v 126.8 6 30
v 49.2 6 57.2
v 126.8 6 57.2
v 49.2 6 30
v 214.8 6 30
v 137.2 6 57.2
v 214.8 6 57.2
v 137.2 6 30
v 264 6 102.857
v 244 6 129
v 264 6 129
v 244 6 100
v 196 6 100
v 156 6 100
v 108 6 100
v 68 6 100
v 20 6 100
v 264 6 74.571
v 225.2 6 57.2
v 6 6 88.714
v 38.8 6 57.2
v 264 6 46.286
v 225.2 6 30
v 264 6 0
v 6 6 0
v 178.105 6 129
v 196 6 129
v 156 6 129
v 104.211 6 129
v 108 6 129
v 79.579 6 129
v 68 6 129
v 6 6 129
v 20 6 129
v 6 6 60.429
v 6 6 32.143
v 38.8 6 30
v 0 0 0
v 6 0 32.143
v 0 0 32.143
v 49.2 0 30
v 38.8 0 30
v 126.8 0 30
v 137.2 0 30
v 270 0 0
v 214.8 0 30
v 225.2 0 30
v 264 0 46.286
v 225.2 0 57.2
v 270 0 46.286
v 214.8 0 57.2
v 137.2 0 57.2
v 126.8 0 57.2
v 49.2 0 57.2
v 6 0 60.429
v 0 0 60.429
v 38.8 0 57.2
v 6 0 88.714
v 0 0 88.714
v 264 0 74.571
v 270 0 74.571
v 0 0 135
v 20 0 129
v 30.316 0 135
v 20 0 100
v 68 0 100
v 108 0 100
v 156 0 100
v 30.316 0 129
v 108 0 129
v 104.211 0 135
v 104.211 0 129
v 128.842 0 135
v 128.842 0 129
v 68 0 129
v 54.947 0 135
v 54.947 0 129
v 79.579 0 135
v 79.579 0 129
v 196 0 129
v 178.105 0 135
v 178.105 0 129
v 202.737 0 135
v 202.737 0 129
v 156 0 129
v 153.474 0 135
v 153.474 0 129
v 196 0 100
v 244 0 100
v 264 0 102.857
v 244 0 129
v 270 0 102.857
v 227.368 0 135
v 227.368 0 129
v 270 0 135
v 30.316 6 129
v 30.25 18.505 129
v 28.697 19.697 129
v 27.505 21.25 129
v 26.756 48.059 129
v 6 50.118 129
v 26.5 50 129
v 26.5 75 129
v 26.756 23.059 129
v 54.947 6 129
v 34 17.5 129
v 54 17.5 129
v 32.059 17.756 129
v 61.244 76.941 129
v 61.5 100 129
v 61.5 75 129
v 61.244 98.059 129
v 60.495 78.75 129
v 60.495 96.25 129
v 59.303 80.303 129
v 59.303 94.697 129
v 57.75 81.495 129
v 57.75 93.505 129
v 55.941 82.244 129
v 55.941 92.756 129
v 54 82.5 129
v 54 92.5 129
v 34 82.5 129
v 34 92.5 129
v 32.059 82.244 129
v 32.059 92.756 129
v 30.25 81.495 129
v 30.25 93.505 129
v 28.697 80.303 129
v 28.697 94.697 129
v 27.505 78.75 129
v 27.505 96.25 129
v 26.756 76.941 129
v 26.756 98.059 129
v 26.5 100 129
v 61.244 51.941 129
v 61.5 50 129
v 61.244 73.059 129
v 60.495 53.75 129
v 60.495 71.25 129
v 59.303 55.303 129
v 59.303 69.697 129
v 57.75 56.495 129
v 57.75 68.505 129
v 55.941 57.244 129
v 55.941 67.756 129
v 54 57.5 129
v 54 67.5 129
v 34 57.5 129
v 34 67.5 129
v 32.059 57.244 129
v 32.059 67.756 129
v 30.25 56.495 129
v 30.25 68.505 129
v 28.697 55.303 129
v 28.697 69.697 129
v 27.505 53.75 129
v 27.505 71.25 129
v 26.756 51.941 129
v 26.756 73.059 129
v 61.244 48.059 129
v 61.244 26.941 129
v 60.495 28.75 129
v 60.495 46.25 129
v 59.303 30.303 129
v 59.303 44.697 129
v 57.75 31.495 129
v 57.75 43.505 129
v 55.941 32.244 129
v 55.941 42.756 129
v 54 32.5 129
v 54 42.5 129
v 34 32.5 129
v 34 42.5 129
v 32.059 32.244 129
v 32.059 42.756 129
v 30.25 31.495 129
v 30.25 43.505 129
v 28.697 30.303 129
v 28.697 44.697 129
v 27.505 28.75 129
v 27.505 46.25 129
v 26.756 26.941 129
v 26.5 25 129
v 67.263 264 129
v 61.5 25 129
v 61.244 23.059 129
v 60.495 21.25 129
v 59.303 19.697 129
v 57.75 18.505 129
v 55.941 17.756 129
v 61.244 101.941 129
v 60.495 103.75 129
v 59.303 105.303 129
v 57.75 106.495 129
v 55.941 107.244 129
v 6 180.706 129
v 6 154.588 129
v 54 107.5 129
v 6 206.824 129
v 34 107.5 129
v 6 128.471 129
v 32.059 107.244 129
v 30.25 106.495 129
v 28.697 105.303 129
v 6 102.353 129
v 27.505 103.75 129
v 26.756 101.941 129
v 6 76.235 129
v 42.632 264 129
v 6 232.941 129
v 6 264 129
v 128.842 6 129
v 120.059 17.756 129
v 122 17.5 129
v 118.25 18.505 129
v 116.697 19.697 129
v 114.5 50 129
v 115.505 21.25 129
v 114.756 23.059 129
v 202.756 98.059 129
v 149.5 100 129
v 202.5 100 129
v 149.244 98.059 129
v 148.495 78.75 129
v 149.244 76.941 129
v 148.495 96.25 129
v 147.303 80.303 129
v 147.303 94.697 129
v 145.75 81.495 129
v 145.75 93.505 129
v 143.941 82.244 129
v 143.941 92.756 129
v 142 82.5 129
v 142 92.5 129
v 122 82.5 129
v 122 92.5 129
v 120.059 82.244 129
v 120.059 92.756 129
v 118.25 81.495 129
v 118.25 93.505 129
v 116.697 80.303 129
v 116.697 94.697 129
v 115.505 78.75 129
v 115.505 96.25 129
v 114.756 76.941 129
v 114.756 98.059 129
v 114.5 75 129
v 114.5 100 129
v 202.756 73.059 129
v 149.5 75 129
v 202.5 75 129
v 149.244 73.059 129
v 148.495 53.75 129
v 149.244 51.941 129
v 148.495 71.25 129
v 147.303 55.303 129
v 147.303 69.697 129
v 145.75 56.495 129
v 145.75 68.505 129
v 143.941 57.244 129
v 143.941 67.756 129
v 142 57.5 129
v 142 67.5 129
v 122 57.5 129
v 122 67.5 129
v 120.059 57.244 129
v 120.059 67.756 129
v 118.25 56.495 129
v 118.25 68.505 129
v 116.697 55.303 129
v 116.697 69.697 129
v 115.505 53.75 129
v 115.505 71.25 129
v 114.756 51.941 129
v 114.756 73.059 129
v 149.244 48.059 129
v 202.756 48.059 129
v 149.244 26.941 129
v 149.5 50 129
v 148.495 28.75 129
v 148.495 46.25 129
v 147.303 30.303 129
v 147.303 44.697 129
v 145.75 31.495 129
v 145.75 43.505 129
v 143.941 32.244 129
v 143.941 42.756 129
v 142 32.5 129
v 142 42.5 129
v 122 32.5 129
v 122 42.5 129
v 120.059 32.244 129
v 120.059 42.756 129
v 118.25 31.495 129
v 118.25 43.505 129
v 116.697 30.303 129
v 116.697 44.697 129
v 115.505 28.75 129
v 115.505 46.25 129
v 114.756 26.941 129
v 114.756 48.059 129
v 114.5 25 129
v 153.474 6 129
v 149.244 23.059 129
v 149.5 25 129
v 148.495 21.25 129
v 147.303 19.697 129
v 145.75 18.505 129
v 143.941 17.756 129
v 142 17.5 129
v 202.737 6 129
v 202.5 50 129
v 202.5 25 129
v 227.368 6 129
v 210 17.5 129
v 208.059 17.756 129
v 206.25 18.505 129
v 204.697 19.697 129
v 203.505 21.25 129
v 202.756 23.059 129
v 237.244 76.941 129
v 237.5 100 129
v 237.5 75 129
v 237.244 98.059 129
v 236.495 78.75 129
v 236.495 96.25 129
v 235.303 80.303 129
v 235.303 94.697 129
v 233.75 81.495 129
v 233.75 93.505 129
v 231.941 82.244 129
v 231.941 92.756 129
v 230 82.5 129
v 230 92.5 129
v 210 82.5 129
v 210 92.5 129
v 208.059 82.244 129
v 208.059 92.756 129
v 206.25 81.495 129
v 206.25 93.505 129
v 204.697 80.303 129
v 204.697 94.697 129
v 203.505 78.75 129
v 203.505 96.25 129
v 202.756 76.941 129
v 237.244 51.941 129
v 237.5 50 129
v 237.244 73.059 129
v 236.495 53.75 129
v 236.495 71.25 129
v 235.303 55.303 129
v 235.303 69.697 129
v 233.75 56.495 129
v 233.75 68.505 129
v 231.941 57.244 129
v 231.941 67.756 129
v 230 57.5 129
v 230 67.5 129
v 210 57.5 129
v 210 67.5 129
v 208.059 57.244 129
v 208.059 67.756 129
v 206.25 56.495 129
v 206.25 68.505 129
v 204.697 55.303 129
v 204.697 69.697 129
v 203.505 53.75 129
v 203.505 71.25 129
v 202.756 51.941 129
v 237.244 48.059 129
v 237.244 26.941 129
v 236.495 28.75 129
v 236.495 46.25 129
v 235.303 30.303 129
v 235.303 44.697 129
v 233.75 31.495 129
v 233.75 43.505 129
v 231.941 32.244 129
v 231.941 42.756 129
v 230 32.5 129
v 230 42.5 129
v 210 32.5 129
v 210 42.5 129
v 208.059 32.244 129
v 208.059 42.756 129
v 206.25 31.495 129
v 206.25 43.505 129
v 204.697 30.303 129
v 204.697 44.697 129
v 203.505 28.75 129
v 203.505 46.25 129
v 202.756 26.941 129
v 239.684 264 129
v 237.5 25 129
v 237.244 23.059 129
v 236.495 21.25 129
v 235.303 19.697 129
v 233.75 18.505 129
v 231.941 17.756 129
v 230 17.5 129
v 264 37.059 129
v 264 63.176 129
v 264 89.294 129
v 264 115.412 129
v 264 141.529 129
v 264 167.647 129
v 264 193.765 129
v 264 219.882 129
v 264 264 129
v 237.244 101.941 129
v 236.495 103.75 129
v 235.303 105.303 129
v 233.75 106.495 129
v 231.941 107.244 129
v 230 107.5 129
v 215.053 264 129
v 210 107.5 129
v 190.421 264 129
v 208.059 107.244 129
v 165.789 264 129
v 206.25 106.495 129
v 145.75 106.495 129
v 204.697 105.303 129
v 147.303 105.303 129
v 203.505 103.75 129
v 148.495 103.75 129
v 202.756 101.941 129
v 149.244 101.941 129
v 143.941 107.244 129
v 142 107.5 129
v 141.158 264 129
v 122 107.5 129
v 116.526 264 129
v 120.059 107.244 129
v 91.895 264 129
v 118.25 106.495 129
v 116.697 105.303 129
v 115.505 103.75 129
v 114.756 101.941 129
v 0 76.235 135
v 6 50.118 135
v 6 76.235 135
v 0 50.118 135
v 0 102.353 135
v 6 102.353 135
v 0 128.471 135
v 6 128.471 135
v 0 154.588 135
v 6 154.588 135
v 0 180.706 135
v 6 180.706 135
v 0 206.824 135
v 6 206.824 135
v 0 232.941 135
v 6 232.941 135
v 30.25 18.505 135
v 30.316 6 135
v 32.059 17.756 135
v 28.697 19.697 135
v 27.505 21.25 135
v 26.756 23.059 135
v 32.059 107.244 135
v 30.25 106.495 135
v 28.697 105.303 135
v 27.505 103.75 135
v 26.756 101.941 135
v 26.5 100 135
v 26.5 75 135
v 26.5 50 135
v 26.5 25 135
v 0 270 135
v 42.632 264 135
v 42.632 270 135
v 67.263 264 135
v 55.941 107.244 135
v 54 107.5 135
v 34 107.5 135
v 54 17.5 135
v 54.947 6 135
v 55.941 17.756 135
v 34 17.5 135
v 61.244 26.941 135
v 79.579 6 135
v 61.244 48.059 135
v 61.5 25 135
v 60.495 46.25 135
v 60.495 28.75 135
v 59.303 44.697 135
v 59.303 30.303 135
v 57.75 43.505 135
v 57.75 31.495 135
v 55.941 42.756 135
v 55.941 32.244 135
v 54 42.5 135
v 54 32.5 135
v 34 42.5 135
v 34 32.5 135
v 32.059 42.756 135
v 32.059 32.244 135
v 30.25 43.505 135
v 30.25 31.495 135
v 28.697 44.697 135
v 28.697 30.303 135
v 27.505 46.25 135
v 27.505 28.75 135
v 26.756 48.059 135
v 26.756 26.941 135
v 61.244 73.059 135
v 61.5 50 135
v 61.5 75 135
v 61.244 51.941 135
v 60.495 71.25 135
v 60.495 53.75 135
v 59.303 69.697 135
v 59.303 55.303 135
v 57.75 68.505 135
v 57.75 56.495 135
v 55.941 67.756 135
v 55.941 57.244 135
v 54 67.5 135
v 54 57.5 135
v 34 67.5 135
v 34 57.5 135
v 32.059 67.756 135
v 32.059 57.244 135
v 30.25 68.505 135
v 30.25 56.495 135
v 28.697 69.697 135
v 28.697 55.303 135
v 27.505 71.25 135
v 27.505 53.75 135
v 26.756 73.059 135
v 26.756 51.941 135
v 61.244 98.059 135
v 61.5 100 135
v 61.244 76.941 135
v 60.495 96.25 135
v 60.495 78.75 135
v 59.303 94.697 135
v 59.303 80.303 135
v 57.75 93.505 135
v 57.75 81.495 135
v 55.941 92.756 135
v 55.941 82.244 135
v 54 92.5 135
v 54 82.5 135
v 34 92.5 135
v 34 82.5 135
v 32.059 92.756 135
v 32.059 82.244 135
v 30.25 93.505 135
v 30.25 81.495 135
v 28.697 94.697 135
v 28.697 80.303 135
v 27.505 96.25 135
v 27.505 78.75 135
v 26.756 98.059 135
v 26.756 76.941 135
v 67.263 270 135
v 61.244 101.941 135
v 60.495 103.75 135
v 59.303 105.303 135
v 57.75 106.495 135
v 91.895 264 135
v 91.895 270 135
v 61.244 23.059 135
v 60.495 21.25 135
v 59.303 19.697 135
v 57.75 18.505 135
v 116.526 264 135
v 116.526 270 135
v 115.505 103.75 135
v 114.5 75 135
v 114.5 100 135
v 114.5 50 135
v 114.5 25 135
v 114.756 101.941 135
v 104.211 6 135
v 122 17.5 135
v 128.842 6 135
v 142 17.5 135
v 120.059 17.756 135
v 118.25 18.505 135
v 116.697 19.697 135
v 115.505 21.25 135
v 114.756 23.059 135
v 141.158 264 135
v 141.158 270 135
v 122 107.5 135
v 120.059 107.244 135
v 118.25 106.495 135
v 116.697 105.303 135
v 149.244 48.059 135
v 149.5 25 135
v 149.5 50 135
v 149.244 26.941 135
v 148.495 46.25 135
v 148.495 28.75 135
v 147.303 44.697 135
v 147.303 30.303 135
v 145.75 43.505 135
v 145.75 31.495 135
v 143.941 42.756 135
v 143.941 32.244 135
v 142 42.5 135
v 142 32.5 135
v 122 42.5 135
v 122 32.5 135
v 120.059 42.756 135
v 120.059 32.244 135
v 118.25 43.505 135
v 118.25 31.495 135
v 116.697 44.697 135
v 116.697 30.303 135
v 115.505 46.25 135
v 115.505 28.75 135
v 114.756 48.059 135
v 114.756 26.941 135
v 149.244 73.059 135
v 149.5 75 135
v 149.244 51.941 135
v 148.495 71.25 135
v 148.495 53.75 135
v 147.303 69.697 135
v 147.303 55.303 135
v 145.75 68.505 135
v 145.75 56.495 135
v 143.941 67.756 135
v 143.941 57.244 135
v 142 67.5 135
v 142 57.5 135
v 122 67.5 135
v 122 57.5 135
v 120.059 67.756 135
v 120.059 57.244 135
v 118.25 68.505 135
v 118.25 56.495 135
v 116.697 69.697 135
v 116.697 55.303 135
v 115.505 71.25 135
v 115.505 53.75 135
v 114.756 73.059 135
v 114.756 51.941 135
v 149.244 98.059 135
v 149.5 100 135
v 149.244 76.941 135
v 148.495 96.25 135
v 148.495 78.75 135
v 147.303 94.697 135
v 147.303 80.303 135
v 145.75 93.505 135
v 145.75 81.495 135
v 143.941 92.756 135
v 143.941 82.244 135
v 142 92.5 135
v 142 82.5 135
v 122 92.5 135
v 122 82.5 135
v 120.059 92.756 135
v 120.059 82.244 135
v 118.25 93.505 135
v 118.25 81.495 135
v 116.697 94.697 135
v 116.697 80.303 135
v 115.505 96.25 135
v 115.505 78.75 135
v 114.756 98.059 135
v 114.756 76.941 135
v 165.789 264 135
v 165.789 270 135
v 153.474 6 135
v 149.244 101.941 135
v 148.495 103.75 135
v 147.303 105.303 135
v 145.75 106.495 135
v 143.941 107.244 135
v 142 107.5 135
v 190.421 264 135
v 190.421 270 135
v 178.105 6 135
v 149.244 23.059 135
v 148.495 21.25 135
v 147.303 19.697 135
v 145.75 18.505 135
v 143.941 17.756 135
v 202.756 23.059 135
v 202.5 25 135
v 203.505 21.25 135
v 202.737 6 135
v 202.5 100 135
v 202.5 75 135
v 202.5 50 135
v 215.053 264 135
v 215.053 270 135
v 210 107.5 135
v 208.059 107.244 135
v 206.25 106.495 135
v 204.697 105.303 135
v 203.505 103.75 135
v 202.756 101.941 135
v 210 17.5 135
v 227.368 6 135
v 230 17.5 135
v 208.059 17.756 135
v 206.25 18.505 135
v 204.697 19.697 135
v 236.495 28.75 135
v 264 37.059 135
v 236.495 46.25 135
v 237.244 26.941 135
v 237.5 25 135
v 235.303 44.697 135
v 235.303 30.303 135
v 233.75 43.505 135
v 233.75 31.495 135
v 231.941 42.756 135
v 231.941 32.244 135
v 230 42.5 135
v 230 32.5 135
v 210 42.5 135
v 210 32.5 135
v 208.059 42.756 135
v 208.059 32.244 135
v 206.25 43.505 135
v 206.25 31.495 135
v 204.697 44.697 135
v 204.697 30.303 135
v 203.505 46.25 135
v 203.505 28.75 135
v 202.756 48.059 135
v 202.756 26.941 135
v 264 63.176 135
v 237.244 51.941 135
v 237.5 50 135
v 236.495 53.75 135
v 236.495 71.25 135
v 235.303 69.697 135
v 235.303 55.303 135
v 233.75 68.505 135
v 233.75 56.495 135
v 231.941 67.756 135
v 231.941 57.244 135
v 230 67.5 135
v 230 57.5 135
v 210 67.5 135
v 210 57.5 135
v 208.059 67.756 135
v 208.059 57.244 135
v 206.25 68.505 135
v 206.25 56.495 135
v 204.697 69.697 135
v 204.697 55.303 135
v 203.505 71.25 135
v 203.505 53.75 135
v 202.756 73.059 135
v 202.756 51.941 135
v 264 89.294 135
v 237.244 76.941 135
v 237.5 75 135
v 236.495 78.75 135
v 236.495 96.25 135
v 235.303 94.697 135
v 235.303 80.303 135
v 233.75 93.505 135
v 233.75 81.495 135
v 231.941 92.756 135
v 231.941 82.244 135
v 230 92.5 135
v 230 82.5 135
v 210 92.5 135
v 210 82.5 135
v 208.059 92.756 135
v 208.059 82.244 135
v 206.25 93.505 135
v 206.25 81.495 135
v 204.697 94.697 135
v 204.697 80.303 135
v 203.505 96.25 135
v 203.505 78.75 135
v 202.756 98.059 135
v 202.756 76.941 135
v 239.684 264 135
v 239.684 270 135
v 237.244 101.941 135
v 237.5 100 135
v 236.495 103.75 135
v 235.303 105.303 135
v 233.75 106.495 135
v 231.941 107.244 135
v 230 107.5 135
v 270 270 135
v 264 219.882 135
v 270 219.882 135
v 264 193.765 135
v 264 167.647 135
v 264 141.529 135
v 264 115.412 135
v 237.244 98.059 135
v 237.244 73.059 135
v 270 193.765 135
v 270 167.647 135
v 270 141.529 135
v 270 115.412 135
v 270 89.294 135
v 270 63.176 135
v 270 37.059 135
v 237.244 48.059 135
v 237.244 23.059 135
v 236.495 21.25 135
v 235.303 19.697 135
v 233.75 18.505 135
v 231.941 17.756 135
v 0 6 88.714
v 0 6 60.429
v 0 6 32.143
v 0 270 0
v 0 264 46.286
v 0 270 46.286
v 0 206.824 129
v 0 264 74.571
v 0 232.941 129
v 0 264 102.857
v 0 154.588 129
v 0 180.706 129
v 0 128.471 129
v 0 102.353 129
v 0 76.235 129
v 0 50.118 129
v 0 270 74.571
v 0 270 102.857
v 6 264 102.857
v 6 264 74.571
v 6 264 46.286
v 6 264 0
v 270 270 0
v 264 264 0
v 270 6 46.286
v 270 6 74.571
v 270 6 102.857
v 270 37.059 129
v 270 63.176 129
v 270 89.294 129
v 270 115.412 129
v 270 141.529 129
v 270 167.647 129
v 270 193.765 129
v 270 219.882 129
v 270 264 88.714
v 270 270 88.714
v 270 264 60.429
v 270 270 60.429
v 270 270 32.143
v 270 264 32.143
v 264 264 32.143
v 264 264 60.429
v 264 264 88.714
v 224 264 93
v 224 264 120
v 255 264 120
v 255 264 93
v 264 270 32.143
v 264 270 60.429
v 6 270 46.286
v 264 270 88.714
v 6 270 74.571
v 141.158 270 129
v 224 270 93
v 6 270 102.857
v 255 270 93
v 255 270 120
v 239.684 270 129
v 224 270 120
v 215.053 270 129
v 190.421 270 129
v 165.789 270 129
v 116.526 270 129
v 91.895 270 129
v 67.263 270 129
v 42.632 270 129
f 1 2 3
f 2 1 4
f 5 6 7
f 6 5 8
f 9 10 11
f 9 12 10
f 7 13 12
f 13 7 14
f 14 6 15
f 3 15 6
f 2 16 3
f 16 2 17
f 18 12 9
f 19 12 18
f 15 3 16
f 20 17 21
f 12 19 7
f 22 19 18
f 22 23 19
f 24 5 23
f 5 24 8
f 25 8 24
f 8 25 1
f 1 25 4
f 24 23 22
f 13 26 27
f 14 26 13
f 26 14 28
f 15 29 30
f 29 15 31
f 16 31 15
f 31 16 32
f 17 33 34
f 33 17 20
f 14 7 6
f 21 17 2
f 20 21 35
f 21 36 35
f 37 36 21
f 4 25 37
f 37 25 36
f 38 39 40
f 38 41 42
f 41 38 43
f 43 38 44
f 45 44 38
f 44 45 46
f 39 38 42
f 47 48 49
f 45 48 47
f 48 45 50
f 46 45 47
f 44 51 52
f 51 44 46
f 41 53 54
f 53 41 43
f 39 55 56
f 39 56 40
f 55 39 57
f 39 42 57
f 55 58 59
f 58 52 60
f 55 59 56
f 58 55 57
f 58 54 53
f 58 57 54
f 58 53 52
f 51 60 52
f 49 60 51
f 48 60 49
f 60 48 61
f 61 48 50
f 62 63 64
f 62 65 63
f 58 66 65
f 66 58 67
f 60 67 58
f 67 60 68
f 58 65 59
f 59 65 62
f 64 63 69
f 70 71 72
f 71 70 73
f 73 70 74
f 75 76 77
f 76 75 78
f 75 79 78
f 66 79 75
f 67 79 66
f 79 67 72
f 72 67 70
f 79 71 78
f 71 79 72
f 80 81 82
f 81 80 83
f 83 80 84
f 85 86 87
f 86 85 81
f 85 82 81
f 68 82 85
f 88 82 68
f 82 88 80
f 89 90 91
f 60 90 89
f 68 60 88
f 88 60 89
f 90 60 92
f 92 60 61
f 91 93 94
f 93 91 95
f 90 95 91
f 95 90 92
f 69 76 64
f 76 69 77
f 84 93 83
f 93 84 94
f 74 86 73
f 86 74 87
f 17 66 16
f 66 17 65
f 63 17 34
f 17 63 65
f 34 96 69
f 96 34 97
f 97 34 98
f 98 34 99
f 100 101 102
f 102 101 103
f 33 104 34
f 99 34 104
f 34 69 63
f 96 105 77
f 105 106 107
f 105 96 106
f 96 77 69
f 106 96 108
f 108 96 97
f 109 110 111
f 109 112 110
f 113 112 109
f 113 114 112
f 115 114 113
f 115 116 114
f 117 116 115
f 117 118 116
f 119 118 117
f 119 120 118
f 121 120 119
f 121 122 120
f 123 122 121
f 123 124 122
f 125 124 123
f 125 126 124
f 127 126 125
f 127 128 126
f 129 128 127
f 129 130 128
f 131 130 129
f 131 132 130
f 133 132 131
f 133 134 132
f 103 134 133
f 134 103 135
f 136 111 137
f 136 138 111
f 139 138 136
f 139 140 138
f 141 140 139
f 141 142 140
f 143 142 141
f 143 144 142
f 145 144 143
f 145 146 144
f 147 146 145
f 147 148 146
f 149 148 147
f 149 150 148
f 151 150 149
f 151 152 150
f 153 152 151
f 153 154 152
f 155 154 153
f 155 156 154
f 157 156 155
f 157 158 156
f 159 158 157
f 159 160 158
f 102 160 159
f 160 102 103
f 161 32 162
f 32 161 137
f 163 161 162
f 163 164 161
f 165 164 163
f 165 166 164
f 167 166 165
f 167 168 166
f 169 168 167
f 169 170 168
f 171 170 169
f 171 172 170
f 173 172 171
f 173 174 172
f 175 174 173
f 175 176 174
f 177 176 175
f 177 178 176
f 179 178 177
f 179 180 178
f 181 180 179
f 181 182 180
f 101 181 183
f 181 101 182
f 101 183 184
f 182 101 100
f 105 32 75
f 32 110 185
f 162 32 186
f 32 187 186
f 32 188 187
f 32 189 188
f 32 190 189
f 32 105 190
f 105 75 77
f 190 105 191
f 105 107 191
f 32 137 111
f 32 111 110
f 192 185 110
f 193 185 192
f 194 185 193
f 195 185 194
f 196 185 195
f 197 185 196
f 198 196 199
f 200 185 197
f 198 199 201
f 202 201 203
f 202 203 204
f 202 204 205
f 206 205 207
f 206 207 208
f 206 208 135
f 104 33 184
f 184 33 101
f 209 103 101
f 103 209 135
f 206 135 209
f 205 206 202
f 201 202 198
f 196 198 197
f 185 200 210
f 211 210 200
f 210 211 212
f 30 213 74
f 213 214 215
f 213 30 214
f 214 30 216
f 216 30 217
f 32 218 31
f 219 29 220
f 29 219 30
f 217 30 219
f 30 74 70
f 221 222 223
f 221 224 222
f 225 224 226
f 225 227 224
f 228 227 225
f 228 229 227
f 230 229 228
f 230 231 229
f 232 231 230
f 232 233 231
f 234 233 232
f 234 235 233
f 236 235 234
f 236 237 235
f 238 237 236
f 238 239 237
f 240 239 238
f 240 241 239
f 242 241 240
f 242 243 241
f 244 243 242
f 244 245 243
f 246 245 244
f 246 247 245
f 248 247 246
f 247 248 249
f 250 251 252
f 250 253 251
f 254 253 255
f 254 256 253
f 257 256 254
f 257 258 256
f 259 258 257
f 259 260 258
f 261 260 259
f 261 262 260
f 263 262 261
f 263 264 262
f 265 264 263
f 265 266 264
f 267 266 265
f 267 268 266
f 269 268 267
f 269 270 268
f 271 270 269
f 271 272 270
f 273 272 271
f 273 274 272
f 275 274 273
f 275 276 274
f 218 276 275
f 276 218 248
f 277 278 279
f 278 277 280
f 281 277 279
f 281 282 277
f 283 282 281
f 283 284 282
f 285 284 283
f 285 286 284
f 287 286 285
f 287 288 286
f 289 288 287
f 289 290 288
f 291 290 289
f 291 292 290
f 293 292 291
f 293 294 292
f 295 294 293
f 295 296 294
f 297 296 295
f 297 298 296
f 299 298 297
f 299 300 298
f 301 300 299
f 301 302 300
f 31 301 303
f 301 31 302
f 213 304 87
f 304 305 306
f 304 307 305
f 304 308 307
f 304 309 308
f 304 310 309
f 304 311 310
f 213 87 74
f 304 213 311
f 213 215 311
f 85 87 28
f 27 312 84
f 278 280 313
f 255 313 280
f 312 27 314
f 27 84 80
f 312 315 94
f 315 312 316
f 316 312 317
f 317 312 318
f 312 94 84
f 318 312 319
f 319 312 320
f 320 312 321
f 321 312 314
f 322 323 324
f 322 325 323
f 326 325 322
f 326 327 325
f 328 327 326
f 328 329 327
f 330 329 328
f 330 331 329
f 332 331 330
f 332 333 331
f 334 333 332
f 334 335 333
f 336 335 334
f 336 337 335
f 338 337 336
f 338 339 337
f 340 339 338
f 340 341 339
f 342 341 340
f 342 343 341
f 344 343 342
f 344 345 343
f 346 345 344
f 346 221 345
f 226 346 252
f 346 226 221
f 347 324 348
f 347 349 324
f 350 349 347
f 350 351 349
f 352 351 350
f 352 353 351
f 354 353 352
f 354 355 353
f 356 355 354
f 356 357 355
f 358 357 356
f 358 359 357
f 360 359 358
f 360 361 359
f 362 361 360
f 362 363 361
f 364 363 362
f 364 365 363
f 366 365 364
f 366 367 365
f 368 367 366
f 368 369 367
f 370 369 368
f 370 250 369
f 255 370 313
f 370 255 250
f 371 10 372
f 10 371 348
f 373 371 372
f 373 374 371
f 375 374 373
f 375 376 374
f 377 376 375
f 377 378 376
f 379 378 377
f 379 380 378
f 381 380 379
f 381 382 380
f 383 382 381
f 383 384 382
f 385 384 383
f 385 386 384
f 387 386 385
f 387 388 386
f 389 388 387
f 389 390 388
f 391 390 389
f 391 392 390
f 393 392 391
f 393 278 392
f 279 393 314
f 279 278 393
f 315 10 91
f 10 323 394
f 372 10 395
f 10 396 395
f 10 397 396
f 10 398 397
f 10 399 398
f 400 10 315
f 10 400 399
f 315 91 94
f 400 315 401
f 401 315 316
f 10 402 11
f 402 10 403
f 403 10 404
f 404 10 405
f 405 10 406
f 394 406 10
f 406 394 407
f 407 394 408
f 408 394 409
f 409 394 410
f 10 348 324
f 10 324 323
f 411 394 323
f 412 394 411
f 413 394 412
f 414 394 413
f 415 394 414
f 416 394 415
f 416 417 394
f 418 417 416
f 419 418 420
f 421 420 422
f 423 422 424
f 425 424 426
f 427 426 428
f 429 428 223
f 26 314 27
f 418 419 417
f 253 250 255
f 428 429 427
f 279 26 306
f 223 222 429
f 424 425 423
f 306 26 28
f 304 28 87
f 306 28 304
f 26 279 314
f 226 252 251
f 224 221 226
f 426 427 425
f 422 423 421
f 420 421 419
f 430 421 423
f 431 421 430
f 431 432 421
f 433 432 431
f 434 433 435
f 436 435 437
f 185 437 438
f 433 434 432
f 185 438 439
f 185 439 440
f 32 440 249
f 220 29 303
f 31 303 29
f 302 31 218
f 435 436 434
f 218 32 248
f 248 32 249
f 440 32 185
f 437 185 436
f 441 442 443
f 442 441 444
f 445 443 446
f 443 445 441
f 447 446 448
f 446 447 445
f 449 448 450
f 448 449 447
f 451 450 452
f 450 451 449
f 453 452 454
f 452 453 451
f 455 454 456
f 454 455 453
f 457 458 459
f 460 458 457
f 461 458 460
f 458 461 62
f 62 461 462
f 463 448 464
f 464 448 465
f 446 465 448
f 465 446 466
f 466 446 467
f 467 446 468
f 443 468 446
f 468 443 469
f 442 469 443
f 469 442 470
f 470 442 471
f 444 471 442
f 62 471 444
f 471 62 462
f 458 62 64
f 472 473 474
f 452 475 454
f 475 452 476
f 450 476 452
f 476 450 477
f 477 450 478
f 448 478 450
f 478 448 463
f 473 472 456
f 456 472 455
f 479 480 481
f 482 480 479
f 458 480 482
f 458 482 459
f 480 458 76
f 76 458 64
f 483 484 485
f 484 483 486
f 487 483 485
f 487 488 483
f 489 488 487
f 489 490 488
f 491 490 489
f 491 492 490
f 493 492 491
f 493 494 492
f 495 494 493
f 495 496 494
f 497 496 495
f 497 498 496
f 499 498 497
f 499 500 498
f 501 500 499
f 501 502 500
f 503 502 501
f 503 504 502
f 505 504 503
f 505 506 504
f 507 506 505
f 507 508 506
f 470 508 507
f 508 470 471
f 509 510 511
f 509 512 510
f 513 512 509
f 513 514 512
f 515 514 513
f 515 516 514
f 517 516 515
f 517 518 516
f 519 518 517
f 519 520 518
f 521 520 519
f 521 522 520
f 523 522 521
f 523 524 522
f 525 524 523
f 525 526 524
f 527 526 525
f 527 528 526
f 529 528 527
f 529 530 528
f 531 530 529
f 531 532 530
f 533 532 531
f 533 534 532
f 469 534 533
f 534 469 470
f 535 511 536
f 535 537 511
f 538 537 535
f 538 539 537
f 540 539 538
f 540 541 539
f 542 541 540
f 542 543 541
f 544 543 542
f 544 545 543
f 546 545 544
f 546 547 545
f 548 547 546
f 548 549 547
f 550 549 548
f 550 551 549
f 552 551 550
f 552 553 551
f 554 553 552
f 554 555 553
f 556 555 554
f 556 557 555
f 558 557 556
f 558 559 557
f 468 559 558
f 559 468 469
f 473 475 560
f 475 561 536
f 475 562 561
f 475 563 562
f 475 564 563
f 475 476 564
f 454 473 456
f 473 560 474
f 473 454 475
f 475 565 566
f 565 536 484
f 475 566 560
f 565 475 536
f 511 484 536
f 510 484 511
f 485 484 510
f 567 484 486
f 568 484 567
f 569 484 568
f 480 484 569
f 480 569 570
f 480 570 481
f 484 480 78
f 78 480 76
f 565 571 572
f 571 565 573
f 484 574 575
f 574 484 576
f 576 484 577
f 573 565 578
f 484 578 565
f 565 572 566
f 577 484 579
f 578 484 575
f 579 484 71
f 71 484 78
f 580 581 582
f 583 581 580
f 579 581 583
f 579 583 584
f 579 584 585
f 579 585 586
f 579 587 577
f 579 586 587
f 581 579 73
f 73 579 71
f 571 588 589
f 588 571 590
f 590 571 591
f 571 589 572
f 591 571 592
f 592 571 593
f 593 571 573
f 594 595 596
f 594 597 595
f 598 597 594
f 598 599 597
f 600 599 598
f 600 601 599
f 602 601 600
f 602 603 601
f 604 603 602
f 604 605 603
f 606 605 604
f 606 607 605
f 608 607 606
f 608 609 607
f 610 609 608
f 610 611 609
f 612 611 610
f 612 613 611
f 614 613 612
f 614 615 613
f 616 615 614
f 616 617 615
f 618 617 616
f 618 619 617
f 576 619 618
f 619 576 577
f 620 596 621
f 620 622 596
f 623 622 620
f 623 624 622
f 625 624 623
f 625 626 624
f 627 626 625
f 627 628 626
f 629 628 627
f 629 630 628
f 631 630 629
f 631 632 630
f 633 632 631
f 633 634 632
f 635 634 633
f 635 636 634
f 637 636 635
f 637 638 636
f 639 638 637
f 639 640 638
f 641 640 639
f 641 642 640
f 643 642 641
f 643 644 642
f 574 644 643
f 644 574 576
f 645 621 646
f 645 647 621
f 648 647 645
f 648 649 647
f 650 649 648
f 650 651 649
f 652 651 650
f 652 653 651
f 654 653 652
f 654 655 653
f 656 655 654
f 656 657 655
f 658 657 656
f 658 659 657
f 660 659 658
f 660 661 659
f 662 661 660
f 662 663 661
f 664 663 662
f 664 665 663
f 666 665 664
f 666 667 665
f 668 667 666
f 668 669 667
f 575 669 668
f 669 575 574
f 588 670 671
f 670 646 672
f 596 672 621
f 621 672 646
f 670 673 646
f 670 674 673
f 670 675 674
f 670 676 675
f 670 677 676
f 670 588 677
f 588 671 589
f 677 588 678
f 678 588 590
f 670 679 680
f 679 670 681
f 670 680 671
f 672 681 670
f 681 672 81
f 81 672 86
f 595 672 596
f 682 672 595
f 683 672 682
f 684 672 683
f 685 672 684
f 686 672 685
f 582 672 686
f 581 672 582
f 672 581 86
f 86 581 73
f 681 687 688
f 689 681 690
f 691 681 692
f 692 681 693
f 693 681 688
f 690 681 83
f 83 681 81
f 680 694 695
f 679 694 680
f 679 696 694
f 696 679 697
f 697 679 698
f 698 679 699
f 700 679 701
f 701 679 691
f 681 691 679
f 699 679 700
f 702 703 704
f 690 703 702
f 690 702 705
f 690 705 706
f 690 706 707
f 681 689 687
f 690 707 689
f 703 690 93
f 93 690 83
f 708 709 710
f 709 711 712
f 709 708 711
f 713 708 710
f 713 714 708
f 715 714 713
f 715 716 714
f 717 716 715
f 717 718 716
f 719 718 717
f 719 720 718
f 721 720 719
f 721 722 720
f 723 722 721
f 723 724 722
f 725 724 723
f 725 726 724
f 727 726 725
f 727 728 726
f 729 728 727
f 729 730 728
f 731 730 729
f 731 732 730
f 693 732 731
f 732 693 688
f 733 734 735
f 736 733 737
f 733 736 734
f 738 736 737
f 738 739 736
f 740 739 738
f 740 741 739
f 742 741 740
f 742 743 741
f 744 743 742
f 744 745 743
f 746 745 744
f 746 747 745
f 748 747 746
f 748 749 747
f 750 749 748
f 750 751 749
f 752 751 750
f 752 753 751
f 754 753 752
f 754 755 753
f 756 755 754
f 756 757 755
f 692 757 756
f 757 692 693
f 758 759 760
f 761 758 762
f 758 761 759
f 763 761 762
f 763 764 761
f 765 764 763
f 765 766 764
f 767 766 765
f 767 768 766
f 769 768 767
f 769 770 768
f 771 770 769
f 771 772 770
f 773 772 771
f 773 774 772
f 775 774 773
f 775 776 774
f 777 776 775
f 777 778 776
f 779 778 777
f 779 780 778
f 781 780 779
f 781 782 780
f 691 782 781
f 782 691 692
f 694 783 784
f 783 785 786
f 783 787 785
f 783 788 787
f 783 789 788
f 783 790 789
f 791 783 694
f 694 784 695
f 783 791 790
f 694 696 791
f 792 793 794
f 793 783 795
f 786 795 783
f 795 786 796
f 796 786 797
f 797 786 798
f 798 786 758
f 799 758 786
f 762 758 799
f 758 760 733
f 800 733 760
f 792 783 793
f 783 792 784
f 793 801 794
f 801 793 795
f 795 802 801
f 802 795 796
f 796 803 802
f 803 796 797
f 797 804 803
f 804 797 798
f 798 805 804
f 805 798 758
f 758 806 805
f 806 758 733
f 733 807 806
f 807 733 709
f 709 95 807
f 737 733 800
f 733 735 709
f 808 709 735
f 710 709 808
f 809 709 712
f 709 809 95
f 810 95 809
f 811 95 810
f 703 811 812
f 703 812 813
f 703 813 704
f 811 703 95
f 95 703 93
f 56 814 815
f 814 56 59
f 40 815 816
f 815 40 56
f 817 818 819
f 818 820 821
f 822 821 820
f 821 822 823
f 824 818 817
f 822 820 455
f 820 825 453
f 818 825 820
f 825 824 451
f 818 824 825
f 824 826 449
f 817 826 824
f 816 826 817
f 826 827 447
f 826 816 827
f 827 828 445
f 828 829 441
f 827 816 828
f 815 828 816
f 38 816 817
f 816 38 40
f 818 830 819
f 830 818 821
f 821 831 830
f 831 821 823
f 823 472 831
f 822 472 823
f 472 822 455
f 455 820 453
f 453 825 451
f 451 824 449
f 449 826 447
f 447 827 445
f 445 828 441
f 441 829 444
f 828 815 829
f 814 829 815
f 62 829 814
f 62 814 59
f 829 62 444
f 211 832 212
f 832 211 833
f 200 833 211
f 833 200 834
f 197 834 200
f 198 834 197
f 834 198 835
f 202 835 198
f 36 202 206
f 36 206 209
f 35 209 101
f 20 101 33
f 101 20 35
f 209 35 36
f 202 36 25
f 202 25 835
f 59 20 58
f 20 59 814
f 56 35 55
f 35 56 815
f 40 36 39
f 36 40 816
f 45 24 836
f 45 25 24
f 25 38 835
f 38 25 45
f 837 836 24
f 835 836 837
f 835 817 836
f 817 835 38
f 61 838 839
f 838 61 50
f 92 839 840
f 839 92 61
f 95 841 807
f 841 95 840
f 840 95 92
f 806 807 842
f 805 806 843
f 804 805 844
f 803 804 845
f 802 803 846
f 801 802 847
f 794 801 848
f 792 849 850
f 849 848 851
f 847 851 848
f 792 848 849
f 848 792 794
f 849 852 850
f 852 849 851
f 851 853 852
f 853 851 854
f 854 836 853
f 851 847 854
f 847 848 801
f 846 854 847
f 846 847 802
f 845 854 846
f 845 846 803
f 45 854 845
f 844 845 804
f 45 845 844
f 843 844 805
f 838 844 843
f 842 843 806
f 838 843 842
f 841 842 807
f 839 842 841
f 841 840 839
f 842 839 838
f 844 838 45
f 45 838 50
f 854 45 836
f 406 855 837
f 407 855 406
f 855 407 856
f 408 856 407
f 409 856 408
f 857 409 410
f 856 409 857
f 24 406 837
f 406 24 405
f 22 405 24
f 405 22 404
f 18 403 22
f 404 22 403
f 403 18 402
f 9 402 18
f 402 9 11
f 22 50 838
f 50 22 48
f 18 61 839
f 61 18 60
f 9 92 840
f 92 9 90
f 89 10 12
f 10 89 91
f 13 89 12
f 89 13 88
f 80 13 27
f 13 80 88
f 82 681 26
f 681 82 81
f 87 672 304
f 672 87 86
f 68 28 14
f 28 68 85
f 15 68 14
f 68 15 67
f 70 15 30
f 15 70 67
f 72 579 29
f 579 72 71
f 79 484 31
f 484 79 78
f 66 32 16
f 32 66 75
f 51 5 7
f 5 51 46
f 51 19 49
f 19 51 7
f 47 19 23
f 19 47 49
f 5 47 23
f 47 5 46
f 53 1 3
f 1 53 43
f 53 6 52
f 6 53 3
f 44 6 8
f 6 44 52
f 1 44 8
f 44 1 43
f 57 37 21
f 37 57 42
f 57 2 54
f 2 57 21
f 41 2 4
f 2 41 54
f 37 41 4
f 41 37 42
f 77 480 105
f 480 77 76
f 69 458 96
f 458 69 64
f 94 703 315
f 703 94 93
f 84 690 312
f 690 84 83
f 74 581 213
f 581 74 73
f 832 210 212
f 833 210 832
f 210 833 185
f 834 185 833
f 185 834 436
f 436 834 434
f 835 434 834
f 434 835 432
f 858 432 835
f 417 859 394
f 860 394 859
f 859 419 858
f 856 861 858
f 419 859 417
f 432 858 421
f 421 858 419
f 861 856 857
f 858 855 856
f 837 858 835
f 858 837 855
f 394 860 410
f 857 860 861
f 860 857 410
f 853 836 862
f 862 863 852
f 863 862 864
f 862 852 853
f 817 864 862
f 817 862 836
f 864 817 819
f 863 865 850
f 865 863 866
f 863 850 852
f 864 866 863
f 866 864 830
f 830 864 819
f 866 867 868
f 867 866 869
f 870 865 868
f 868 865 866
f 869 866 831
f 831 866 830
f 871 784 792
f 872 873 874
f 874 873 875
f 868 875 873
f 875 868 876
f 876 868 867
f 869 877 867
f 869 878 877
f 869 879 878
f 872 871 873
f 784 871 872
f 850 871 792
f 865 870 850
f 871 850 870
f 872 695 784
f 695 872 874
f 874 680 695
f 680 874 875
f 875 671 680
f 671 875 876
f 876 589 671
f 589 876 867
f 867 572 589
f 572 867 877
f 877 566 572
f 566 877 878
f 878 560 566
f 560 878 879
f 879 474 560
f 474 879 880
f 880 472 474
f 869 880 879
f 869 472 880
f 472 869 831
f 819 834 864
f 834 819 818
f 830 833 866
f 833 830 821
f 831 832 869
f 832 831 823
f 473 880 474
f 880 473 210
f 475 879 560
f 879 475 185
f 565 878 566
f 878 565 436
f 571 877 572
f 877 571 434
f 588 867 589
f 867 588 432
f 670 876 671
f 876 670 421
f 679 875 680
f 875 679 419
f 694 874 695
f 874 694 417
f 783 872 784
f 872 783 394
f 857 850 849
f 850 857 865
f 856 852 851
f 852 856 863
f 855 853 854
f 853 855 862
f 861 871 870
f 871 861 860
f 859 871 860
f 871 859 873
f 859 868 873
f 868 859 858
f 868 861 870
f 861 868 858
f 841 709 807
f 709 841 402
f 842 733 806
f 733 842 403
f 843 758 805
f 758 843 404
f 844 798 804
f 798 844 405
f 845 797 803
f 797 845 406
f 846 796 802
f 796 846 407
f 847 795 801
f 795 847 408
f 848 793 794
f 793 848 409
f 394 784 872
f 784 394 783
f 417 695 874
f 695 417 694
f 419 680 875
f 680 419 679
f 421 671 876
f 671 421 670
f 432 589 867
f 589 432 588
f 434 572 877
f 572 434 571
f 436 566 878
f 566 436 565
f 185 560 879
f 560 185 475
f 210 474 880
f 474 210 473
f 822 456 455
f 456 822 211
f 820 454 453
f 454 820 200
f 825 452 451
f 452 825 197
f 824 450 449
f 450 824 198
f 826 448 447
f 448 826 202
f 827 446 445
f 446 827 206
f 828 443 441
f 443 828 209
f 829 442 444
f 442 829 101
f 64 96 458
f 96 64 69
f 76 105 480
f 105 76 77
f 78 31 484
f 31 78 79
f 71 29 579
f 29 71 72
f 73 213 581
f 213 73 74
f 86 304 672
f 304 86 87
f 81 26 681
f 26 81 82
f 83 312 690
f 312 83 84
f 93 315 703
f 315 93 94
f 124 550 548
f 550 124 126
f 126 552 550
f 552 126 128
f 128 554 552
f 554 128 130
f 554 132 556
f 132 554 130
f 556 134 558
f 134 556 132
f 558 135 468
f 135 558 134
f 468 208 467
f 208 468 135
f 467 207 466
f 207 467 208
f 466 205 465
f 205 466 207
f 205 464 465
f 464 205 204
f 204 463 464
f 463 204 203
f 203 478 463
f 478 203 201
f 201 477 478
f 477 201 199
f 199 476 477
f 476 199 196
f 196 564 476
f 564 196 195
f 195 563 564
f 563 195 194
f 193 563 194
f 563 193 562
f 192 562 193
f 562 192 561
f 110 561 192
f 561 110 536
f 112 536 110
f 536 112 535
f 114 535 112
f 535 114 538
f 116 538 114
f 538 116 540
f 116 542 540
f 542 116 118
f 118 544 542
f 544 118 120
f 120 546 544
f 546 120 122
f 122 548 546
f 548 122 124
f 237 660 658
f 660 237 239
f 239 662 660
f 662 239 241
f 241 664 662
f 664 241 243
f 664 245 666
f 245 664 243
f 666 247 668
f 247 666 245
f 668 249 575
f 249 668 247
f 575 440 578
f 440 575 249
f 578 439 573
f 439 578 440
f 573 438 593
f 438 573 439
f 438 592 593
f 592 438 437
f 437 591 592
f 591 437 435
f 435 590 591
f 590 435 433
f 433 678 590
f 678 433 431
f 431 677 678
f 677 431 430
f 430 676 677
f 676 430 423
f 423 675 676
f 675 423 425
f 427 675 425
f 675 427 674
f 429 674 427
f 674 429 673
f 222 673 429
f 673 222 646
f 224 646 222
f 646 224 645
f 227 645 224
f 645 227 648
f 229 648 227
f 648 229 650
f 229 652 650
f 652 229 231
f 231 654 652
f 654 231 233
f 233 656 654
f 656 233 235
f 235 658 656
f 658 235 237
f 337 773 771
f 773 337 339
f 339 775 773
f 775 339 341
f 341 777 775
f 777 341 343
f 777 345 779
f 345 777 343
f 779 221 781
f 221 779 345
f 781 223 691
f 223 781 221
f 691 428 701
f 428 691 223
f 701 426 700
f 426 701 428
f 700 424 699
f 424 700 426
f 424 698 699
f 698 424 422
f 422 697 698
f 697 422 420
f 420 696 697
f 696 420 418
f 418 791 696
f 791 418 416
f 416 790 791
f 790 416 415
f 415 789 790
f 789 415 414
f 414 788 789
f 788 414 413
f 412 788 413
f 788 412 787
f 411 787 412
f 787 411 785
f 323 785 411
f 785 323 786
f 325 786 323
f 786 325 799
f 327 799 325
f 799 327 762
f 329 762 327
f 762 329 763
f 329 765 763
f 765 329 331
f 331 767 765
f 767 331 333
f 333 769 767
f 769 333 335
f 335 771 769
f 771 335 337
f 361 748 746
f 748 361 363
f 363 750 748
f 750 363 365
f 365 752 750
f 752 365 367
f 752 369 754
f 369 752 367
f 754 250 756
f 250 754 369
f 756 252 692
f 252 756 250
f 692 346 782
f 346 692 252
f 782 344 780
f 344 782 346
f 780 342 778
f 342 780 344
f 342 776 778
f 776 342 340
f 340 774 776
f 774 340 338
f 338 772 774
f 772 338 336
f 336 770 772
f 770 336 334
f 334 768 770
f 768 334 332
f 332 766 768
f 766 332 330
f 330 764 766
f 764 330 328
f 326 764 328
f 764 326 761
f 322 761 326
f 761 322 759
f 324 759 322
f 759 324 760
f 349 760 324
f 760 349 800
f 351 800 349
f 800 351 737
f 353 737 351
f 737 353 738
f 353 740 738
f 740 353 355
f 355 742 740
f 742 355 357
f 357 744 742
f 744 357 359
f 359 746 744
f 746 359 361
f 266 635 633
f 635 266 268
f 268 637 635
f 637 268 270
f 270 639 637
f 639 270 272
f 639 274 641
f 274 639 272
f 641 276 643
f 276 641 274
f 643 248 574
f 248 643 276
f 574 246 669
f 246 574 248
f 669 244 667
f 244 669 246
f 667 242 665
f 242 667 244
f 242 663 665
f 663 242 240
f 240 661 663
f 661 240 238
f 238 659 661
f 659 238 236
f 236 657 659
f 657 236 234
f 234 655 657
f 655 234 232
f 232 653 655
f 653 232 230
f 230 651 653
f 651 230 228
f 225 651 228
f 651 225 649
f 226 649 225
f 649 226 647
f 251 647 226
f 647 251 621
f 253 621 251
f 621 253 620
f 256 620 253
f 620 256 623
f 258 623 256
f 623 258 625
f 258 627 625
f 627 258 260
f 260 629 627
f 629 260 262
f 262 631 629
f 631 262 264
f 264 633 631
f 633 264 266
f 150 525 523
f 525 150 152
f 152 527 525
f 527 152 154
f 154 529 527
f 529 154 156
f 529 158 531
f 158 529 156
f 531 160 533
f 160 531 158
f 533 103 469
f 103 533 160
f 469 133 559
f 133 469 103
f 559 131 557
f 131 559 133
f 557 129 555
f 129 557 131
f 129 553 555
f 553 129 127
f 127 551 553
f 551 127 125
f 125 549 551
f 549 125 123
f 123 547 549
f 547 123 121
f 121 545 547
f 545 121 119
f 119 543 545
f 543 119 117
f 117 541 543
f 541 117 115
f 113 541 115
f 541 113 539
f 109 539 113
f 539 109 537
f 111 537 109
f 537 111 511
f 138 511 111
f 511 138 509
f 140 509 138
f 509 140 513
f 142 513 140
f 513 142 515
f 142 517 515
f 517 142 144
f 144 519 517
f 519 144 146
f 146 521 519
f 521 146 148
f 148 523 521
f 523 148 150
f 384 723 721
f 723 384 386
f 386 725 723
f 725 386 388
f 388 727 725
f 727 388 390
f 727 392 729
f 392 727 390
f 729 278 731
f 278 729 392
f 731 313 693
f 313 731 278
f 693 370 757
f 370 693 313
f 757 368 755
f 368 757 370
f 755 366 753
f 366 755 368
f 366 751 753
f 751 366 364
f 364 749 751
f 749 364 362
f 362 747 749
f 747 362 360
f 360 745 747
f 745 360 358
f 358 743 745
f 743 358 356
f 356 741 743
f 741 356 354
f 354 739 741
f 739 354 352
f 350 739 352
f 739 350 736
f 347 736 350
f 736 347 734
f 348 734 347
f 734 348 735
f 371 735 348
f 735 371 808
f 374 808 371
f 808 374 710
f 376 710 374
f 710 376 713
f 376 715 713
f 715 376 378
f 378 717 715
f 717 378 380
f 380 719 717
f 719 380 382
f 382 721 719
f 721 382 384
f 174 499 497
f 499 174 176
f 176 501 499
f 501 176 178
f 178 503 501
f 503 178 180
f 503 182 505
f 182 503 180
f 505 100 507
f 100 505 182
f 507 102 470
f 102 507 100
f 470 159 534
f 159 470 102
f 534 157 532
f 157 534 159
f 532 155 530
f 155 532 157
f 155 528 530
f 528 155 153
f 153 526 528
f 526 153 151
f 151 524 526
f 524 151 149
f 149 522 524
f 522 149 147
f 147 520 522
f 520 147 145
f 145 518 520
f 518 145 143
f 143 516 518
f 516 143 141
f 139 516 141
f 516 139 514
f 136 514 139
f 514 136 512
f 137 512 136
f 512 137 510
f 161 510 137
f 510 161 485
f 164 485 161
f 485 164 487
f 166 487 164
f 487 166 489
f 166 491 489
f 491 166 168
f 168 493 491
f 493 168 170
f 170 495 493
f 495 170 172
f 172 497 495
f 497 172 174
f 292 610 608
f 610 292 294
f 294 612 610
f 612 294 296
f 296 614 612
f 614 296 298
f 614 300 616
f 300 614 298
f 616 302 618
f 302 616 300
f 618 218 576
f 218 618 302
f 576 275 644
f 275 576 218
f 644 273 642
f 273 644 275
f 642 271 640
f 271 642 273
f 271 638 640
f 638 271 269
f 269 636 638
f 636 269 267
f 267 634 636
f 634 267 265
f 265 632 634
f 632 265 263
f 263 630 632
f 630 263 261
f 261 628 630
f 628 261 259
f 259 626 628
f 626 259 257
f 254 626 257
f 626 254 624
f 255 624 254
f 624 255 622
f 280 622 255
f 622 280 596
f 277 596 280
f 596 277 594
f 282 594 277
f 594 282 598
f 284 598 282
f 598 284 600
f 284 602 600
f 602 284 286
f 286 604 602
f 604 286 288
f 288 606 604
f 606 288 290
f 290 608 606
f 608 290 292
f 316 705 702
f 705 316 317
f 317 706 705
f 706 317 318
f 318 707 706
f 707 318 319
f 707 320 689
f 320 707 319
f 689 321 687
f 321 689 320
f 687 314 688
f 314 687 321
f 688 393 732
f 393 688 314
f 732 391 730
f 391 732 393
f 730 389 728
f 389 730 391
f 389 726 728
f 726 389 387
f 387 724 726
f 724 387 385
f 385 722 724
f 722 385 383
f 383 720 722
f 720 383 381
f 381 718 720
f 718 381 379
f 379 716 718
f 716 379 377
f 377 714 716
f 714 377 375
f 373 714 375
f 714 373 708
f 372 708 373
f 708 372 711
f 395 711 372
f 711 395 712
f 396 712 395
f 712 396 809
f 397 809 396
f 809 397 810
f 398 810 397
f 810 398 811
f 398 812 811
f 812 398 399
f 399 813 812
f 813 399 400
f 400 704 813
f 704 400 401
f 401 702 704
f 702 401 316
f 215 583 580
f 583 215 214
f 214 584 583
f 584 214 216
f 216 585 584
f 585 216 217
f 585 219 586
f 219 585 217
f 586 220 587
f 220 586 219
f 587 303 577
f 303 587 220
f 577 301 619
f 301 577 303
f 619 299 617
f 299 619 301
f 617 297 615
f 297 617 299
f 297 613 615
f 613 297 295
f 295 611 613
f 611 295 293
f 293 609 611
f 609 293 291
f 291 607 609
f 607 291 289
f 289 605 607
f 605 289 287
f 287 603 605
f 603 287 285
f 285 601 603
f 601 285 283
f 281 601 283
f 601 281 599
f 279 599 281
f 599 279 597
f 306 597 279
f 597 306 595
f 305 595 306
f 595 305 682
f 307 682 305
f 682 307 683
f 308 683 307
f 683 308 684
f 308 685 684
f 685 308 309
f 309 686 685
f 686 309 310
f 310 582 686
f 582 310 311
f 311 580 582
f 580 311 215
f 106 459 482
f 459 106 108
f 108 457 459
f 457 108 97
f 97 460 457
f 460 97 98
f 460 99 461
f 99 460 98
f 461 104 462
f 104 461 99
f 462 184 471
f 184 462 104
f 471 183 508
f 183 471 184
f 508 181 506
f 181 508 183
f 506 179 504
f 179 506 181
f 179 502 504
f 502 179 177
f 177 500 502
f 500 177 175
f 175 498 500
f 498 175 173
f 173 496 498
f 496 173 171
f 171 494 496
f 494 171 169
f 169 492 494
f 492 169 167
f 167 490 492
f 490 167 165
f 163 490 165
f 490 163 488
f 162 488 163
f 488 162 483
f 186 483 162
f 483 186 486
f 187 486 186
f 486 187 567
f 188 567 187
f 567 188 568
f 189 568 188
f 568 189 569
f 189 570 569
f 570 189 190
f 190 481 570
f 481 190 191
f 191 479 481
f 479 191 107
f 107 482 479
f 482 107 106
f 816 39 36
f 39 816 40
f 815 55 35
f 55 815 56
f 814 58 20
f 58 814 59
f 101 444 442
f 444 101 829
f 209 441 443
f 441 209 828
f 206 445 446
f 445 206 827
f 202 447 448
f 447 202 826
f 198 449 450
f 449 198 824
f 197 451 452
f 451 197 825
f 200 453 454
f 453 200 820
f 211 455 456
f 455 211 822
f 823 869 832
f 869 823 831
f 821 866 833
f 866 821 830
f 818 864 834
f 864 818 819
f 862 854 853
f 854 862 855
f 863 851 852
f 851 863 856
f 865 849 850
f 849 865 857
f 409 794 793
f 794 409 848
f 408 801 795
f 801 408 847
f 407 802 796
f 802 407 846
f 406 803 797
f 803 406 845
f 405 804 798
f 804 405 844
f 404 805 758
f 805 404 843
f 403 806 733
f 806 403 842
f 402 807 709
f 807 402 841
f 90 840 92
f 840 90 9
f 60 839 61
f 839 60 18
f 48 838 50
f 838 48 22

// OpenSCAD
// file: psu-dimensions.scad
total_width = 270;
total_depth = 270;
total_height = 135;

outer_thickness = 3;
inner_thickness = 6;

margin = 15;
cutting_space = 5;

sections = 3;

section_width = (total_width - 2 * outer_thickness) / 3;

half_section_width = section_width / 2;

inner_depth = total_depth - outer_thickness;

switch_height = 27.2;
switch_width = 10.4;

meter_width = 48;
meter_height = 29;

meter_switch_gap = 12;

meter_and_switch_height = max(meter_height, switch_height);
meter_and_switch_width = meter_width + meter_switch_gap + switch_width;

mains_inlet_width = 31;
mains_inlet_height = 27;

switch_offset = 30;
meter_offset = 100;

adjuster_width = 79;
adjuster_height = 42;
adjuster_depth = 42;
adjuster_y_offset = 25;

binding_post_hole_inner_diameter = 15;
binding_post_hole_outer_diameter = 3;
binding_post_rows = 4;
binding_post_spacing = 20;
binding_post_row_spacing = 25;
binding_post_offset = binding_post_row_spacing;

ventilation_panel_start = mains_inlet_width + margin * 3;
ventilation_hole_diameter = 10;
ventilation_hole_spacing = ventilation_hole_diameter * 1.5;
rear_ventilation_holes_per_row = (total_width - (ventilation_panel_start + margin * 2)) / ventilation_hole_spacing;
rear_ventilation_hole_rows = (total_height  - (margin * 2)) / ventilation_hole_spacing;
side_ventilation_area_length = total_depth/3;
side_ventilation_holes_per_row = side_ventilation_area_length / ventilation_hole_spacing;
side_ventilation_hole_rows = (total_height  - (margin * 2)) / ventilation_hole_spacing;

module binding_post_hole_pair(diameter, spacing, join) {
     translate([-spacing/2, 0]) circle(d=diameter);
     translate([spacing/2, 0]) circle(d=diameter);
     if (join) {
         translate([-spacing/2, -diameter/2]) square([spacing, diameter]);
     }
}

module meter_and_switch() {
    translate([-meter_and_switch_width/2, -meter_and_switch_height/2]) {
        square([switch_width, switch_height]);
        translate([switch_width + meter_switch_gap, (switch_height - meter_height)/2]) {
            square([meter_width, meter_height]);
        }
    }
}
// file: psu-case-inner.scad
include <psu-box.scad>
include <psu-dimensions.scad>

module one_front_inner_cutout() {
     translate([half_section_width - switch_width/2, switch_offset]) square([switch_width, switch_height]);
     translate([half_section_width - meter_width/2, meter_offset]) square([meter_width, meter_height]);
}

module one_top_inner_cutout() {
     for (i=[1:binding_post_rows]) {
          translate([half_section_width, i * binding_post_row_spacing]) binding_post_hole_pair(binding_post_hole_inner_diameter, binding_post_spacing, true);
     }
}

module front_inner_cutouts() {
     for (i=[0:sections]) {
          translate([i * section_width, 0]) {
               one_front_inner_cutout();
          }
     }
}

module back_inner_cutouts() {
     translate([margin, total_height - (margin + mains_inlet_height)]) square([mains_inlet_width, mains_inlet_height]);
}

module top_inner_cutouts() {
     for (i=[0:sections]) {
          translate([i * section_width, 0]) {
               one_top_inner_cutout();
          }
     }
}

module psu_case_inner() {
     box(total_width, total_height, total_depth, inner_thickness,
         assemble=true,
         labels=true,
         open_bottom=true) {
          front_inner_cutouts();
          top_inner_cutouts();
          back_inner_cutouts();
     };
}

psu_case_inner();
// main file
include <psu-case-inner.scad>

module cut_inner_front_only() {
     box(total_width, total_height, total_depth, inner_thickness,
         assemble=false,
         cut_parts="front",
         labels=true,
         open_bottom=true) {
          front_inner_cutouts();
          top_inner_cutouts();
          back_inner_cutouts();
          left_inner_cutouts();
          right_inner_cutouts();
     }
}

cut_inner_front_only();
